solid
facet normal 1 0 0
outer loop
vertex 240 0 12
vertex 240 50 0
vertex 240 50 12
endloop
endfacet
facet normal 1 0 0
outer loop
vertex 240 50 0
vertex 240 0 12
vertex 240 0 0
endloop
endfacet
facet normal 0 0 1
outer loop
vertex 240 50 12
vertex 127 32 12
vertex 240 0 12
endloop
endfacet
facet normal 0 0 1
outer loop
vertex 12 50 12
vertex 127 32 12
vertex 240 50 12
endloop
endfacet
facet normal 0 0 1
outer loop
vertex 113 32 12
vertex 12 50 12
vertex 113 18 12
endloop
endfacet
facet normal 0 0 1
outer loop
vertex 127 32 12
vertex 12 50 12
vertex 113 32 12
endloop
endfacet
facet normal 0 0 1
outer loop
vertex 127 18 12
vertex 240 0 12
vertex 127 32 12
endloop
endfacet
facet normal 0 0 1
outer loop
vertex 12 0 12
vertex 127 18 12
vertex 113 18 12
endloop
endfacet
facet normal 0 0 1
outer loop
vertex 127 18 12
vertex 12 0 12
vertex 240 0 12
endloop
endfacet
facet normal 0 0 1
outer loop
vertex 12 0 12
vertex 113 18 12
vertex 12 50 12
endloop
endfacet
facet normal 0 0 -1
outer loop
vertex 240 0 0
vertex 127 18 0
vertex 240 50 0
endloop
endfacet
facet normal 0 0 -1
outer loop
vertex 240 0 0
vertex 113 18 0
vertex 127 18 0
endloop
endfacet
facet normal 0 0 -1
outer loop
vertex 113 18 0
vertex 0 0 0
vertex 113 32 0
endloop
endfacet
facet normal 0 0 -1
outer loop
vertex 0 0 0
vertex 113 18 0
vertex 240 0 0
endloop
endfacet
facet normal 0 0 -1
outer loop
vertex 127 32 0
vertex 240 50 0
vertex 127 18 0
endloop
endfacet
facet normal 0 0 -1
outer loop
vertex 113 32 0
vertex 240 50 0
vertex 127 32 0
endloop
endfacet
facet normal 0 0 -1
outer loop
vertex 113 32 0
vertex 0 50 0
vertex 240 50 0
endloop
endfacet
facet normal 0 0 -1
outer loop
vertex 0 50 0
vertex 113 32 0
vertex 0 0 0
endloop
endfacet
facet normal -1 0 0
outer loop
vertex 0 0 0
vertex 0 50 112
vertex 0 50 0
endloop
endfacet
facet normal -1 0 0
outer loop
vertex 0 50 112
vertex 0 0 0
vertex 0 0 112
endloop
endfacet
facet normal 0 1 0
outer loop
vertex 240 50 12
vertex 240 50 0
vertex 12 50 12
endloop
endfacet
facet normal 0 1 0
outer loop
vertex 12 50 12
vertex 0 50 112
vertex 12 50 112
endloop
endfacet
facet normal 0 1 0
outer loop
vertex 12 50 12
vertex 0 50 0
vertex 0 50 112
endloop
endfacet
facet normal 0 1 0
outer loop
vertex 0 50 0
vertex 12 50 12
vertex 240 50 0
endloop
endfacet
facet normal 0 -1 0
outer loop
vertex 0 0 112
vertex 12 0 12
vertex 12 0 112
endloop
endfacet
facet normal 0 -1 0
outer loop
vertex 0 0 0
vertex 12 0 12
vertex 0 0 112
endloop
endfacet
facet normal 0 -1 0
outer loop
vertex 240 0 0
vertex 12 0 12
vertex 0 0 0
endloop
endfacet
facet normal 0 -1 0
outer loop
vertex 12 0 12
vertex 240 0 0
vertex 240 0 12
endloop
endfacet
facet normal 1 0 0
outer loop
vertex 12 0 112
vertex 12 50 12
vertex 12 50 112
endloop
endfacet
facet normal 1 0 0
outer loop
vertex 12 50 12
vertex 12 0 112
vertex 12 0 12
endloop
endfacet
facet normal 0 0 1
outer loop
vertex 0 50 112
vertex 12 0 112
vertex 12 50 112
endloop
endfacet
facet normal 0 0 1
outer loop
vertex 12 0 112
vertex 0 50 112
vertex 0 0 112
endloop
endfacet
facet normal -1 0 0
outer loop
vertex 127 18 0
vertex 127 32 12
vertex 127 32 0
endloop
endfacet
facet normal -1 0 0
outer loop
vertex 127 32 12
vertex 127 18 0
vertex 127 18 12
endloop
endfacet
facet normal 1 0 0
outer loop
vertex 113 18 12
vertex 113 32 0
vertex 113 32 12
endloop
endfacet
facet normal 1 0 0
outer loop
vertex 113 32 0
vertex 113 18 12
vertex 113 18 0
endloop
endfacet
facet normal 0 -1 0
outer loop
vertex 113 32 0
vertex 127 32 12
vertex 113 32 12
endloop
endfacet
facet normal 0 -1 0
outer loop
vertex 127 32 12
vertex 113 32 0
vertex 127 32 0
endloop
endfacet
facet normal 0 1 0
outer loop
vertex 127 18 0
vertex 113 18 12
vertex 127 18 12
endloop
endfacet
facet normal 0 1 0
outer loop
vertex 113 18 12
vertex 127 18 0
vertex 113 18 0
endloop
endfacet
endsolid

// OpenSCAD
$fn = 32;

// ----------------------------------------------------------------------
// Gantry bracket: 200-250 mm L bracket
// ----------------------------------------------------------------------

// --- parameters (mm) ---
base_l = 240;             // base arm length, X
arm_w = 50;               // arm width, Y
thick = 12;               // arm thickness
up_h = 100;               // vertical arm height, Z
slot_w = 14;              // adjustment slot width in the base
fit_tol = 0.02;           // tolerance for press fits, mm
free_tol = 0.2;           // tolerance for clearance fits, mm

total_h = up_h + thick;  // overall height

difference() {
  union() {
    cube([base_l, arm_w, thick]);
    cube([thick, arm_w, total_h]);
  }
  translate([base_l / 2 - slot_w / 2, arm_w / 2 - slot_w / 2, -1])
    cube([slot_w, slot_w, thick + 2]);
}
